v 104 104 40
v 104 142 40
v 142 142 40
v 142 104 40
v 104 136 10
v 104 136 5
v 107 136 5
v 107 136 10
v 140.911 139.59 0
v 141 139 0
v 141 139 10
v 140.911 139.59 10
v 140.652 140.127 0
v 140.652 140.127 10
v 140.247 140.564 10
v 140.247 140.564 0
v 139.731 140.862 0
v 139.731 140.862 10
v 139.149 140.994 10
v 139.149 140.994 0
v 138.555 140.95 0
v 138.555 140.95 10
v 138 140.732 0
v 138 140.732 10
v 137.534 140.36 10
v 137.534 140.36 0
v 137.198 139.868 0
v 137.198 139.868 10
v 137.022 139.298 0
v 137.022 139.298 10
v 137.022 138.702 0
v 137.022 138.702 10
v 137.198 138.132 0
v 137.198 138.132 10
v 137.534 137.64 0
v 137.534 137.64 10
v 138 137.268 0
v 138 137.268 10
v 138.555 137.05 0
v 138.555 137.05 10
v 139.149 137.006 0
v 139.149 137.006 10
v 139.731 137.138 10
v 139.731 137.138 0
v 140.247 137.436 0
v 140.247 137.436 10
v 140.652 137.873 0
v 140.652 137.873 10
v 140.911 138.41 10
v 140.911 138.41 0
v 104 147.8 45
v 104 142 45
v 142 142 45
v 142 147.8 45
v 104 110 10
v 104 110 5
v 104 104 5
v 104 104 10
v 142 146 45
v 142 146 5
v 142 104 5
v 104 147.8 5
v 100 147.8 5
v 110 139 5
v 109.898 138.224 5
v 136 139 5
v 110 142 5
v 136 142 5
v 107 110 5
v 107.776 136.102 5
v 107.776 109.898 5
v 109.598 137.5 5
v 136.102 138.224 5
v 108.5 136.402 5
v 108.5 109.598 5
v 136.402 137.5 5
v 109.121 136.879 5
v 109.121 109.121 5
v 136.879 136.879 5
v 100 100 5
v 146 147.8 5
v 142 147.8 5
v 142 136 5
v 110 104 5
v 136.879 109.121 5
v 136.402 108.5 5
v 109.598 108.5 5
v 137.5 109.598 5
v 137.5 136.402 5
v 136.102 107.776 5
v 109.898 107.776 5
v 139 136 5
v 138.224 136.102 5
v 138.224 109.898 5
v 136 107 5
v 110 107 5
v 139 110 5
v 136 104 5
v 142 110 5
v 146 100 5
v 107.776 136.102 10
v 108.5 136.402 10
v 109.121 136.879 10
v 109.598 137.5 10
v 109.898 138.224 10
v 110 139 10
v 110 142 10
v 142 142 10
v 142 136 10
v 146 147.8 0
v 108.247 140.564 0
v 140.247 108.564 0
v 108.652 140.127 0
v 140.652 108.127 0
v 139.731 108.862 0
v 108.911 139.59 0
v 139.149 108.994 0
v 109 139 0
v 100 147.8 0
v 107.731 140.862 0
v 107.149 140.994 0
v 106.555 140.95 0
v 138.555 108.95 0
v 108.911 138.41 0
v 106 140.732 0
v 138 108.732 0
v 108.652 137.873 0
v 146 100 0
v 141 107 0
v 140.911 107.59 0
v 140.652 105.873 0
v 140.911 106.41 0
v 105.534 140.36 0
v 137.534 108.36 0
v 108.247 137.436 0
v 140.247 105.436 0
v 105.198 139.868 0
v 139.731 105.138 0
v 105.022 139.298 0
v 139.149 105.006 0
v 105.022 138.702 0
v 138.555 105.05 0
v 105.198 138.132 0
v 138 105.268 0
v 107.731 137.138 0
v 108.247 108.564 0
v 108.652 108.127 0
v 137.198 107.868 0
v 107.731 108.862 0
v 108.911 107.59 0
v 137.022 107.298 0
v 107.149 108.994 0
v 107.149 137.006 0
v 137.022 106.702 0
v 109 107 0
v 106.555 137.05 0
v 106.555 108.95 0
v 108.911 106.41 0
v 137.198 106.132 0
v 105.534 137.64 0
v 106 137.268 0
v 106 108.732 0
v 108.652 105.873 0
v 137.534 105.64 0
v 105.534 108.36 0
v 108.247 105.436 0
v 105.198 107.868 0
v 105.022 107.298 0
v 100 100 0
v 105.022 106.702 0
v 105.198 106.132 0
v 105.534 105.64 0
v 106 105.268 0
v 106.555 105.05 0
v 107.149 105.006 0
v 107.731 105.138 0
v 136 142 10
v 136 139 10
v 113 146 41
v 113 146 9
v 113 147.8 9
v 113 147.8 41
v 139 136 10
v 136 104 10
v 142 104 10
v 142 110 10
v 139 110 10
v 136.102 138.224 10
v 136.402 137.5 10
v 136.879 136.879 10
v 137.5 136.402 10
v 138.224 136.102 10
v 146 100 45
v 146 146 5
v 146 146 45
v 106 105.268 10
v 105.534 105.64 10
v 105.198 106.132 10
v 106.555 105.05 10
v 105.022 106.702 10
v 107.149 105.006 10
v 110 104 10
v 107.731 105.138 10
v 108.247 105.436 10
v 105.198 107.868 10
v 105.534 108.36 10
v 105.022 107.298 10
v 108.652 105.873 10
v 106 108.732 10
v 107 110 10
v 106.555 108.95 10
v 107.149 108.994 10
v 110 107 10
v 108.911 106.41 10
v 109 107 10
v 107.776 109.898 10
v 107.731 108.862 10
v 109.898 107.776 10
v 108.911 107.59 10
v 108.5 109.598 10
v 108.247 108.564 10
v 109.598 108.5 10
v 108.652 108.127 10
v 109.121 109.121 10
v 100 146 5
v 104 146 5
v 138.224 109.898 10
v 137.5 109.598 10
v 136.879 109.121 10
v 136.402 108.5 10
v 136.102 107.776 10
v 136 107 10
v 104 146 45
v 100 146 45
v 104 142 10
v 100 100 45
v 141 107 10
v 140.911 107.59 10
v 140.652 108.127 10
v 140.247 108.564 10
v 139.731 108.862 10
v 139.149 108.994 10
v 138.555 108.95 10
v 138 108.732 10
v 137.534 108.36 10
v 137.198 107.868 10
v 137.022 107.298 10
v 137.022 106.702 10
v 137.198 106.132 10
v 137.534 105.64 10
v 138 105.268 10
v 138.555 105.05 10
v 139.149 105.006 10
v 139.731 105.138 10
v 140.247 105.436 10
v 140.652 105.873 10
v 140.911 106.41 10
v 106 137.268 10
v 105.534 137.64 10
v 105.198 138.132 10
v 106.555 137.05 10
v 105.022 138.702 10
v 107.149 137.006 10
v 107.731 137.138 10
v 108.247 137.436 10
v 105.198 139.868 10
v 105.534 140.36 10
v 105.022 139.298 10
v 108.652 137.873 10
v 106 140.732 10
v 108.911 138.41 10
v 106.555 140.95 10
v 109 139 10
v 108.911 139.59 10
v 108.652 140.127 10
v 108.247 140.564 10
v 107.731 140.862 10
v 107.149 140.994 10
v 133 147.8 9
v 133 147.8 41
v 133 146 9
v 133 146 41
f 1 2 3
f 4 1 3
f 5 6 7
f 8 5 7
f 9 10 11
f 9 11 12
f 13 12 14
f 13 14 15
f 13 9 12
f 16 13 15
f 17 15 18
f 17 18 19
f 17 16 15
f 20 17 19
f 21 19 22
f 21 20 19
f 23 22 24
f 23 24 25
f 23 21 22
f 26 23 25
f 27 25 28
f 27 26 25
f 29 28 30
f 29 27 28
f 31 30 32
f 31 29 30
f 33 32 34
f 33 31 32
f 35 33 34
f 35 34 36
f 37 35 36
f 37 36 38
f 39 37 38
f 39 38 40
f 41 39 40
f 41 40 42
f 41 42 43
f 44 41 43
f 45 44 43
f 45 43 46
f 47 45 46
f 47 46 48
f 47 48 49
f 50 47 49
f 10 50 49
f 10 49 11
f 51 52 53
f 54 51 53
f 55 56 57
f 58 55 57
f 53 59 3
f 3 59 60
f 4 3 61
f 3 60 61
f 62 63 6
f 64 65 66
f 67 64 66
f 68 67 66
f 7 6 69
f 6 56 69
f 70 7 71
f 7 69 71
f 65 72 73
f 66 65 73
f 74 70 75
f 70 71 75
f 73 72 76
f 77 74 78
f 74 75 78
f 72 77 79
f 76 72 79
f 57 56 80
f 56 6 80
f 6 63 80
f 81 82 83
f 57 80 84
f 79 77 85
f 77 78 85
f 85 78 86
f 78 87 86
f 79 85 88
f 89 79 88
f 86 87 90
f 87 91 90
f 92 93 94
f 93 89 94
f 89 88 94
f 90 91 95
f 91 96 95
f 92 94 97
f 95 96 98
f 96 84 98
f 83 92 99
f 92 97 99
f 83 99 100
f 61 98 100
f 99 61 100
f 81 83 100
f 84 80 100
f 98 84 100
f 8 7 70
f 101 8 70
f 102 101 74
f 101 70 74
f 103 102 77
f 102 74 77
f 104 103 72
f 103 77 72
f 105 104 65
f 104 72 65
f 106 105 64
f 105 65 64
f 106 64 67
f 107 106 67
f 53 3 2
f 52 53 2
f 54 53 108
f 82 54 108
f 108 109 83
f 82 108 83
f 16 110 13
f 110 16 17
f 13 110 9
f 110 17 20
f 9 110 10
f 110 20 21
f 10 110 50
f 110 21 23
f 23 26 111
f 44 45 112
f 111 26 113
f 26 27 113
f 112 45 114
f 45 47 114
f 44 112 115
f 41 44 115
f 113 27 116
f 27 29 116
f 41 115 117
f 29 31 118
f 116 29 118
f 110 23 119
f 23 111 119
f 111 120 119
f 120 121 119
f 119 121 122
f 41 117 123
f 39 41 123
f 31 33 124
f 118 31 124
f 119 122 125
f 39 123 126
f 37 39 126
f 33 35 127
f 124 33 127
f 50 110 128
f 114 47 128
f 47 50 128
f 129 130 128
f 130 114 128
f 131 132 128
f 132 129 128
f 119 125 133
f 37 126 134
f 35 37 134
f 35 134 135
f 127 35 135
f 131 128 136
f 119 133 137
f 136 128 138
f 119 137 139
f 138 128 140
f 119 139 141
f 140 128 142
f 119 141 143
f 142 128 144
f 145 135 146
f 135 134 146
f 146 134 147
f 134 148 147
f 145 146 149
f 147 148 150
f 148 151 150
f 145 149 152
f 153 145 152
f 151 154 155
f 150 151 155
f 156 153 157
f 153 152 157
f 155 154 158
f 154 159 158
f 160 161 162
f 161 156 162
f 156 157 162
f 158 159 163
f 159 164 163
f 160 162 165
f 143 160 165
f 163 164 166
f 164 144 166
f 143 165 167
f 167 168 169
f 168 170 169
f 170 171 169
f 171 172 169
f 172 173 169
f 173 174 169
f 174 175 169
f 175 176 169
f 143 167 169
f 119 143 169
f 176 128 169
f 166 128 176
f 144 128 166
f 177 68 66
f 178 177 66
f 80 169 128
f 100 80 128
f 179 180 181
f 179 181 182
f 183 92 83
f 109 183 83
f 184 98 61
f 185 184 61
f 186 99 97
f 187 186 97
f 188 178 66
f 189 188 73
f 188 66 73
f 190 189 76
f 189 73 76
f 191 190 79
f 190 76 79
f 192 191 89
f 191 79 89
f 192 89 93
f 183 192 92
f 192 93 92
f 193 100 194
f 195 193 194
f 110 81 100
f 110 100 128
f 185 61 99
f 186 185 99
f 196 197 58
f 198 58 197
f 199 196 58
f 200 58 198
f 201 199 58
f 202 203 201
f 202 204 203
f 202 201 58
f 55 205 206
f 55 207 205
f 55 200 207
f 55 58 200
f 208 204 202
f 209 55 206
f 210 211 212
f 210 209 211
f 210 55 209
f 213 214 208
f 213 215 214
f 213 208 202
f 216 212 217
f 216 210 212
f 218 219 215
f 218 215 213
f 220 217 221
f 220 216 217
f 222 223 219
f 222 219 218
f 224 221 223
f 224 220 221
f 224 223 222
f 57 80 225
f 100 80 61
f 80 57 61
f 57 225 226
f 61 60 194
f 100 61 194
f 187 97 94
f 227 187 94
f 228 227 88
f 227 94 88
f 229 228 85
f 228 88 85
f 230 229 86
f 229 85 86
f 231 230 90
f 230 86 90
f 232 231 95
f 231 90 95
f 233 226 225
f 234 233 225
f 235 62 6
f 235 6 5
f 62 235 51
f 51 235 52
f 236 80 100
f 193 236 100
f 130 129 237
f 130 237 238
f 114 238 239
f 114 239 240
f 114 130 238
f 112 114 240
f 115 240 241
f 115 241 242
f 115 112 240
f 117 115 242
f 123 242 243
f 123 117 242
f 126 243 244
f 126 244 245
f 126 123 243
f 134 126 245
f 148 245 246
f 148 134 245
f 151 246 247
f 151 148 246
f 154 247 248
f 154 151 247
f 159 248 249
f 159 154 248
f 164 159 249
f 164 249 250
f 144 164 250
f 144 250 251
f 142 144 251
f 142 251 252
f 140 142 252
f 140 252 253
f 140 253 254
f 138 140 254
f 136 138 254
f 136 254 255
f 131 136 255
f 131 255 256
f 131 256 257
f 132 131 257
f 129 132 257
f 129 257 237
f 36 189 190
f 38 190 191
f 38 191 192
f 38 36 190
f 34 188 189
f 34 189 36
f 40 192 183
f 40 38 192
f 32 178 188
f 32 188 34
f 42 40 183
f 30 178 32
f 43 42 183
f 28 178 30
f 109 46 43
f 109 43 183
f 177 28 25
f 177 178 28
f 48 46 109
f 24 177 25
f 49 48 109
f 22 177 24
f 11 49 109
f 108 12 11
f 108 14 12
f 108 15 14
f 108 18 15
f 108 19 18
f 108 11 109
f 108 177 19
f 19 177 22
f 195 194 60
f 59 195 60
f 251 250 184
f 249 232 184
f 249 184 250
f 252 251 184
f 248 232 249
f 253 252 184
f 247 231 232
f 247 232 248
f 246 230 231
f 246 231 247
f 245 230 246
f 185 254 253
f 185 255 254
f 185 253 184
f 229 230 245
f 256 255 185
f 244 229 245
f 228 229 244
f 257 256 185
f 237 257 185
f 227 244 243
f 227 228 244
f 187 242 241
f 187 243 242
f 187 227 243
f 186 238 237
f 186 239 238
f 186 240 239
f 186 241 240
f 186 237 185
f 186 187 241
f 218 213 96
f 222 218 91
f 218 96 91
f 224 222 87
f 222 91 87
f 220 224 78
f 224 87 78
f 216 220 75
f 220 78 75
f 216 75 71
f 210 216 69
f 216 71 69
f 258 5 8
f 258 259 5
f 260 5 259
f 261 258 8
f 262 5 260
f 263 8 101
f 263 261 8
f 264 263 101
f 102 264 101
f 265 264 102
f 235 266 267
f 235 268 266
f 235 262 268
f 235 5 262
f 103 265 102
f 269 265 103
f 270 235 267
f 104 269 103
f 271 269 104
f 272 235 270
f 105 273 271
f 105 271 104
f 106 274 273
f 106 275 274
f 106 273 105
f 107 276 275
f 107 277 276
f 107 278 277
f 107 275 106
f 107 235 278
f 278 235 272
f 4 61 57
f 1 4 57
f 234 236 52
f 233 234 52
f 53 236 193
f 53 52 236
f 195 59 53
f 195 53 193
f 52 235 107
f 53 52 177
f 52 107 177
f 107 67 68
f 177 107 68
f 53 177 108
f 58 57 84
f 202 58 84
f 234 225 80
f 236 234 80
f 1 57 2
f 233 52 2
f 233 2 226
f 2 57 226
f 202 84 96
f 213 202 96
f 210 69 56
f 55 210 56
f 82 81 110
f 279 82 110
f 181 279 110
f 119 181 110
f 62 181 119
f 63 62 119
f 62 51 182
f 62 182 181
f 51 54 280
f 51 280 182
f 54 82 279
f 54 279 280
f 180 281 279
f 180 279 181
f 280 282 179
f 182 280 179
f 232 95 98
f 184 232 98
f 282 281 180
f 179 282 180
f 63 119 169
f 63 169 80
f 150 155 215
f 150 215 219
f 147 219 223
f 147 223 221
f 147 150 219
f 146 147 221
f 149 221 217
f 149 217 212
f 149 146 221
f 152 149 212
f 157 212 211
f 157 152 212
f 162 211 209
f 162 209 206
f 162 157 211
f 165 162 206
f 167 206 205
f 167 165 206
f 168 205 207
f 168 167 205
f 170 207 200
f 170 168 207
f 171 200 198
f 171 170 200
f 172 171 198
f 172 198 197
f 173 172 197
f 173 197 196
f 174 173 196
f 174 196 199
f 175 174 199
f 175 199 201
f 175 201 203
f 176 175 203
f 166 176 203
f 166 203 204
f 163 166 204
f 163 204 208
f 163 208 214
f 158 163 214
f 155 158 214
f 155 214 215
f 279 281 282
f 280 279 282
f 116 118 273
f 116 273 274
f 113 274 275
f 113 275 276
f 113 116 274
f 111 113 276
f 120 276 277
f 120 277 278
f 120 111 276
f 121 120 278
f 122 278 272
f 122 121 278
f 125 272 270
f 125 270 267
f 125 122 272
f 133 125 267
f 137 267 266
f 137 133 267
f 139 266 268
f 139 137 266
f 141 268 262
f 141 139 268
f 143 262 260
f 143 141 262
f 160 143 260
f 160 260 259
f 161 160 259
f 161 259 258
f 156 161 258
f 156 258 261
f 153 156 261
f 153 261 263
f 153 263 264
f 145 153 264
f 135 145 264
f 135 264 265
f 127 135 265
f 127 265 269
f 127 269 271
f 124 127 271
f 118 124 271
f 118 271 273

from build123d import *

# Parameters (mm, degrees)
F1_R     = 2
F2_DEPTH = 5
F3_DEPTH = 10
F4_DEPTH = 45
F5_START = 5
F5_DEPTH = 40
F6_START = 40
F6_DEPTH = 5
F7_W     = 20
F7_H     = 32
F8_DEPTH = 1.8


with BuildPart() as f2:
    # F1 (on Top) → F2 (new body)
    with BuildSketch(Plane.XY):
        with BuildLine():
            Line((110, 142), (104, 142))
            Line((104, 142), (104, 136))
            Line((104, 136), (107, 136))
            ThreePointArc((107, 136), (109.1213203436, 136.8786796564), (110, 139))
            Line((110, 139), (110, 142))
        make_face()
        with Locations((107, 139)):
            Circle(F1_R, mode=Mode.SUBTRACT)
        with BuildLine():
            Line((136, 142), (110, 142))
            Line((110, 142), (110, 139))
            ThreePointArc((110, 139), (109.1213203436, 136.8786796564), (107, 136))
            Line((107, 136), (104, 136))
            Line((104, 136), (104, 110))
            Line((104, 110), (107, 110))
            ThreePointArc((107, 110), (109.1213203436, 109.1213203436), (110, 107))
            Line((110, 107), (110, 104))
            Line((110, 104), (136, 104))
            Line((136, 104), (136, 107))
            ThreePointArc((136, 107), (136.8786796564, 109.1213203436), (139, 110))
            Line((139, 110), (142, 110))
            Line((142, 110), (142, 136))
            Line((142, 136), (139, 136))
            ThreePointArc((139, 136), (136.8786796564, 136.8786796564), (136, 139))
            Line((136, 139), (136, 142))
        make_face()
        Polygon((100, 146), (100, 100), (146, 100), (146, 146), (142, 146), (142, 142), (142, 136), (142, 110), (142, 104), (136, 104), (110, 104), (104, 104), (104, 110), (104, 136), (104, 142), (104, 146), align=None)
        with BuildLine():
            Line((142, 136), (142, 142))
            Line((142, 142), (136, 142))
            Line((136, 142), (136, 139))
            ThreePointArc((136, 139), (136.8786796564, 136.8786796564), (139, 136))
            Line((139, 136), (142, 136))
        make_face()
        with Locations((139, 139)):
            Circle(F1_R, mode=Mode.SUBTRACT)
        with BuildLine():
            Line((107, 110), (104, 110))
            Line((104, 110), (104, 104))
            Line((104, 104), (110, 104))
            Line((110, 104), (110, 107))
            ThreePointArc((110, 107), (109.1213203436, 109.1213203436), (107, 110))
        make_face()
        with Locations((107, 107)):
            Circle(F1_R, mode=Mode.SUBTRACT)
        with BuildLine():
            Line((142, 104), (142, 110))
            Line((142, 110), (139, 110))
            ThreePointArc((139, 110), (136.8786796564, 109.1213203436), (136, 107))
            Line((136, 107), (136, 104))
            Line((136, 104), (142, 104))
        make_face()
        with Locations((139, 107)):
            Circle(F1_R, mode=Mode.SUBTRACT)
        Polygon((142, 146), (104, 146), (104, 142), (110, 142), (136, 142), (142, 142), align=None)
    extrude(amount=F2_DEPTH)

    # F1 (on Top) → F3 (join)
    with BuildSketch(Plane.XY):
        with BuildLine():
            Line((110, 142), (104, 142))
            Line((104, 142), (104, 136))
            Line((104, 136), (107, 136))
            ThreePointArc((107, 136), (109.1213203436, 136.8786796564), (110, 139))
            Line((110, 139), (110, 142))
        make_face()
        with Locations((107, 139)):
            Circle(F1_R, mode=Mode.SUBTRACT)
        with BuildLine():
            Line((142, 136), (142, 142))
            Line((142, 142), (136, 142))
            Line((136, 142), (136, 139))
            ThreePointArc((136, 139), (136.8786796564, 136.8786796564), (139, 136))
            Line((139, 136), (142, 136))
        make_face()
        with Locations((139, 139)):
            Circle(F1_R, mode=Mode.SUBTRACT)
        with BuildLine():
            Line((107, 110), (104, 110))
            Line((104, 110), (104, 104))
            Line((104, 104), (110, 104))
            Line((110, 104), (110, 107))
            ThreePointArc((110, 107), (109.1213203436, 109.1213203436), (107, 110))
        make_face()
        with Locations((107, 107)):
            Circle(F1_R, mode=Mode.SUBTRACT)
        with BuildLine():
            Line((142, 104), (142, 110))
            Line((142, 110), (139, 110))
            ThreePointArc((139, 110), (136.8786796564, 109.1213203436), (136, 107))
            Line((136, 107), (136, 104))
            Line((136, 104), (142, 104))
        make_face()
        with Locations((139, 107)):
            Circle(F1_R, mode=Mode.SUBTRACT)
    extrude(amount=F3_DEPTH)

    # F1 (on Top) → F4 (join)
    with BuildSketch(Plane.XY):
        Polygon((142, 146), (104, 146), (104, 142), (110, 142), (136, 142), (142, 142), align=None)
    extrude(amount=F4_DEPTH)

    # F7 (on face) → F8 (join)
    with BuildSketch(Plane(origin=(0, 146, 0), x_dir=(-1, 0, 0), z_dir=(0, 1, 0))):
        Polygon((-146, 5), (-146, 0), (-100, 0), (-100, 5), (-104, 5), (-104, 45), (-142, 45), (-142, 5), align=None)
        with Locations((-123, 25)):
            Rectangle(F7_W, F7_H, mode=Mode.SUBTRACT)
    extrude(amount=F8_DEPTH)


with BuildPart() as f5:
    # F1 (on Top) → F5 (new body)
    with BuildSketch(Plane.XY.offset(F5_START)):
        Polygon((100, 146), (100, 100), (146, 100), (146, 146), (142, 146), (142, 142), (142, 136), (142, 110), (142, 104), (136, 104), (110, 104), (104, 104), (104, 110), (104, 136), (104, 142), (104, 146), align=None)
    extrude(amount=F5_DEPTH)

    # F1 (on Top) → F6 (join)
    with BuildSketch(Plane.XY.offset(F6_START)):
        with BuildLine():
            Line((136, 142), (110, 142))
            Line((110, 142), (110, 139))
            ThreePointArc((110, 139), (109.1213203436, 136.8786796564), (107, 136))
            Line((107, 136), (104, 136))
            Line((104, 136), (104, 110))
            Line((104, 110), (107, 110))
            ThreePointArc((107, 110), (109.1213203436, 109.1213203436), (110, 107))
            Line((110, 107), (110, 104))
            Line((110, 104), (136, 104))
            Line((136, 104), (136, 107))
            ThreePointArc((136, 107), (136.8786796564, 109.1213203436), (139, 110))
            Line((139, 110), (142, 110))
            Line((142, 110), (142, 136))
            Line((142, 136), (139, 136))
            ThreePointArc((139, 136), (136.8786796564, 136.8786796564), (136, 139))
            Line((136, 139), (136, 142))
        make_face()
        with BuildLine():
            Line((107, 110), (104, 110))
            Line((104, 110), (104, 104))
            Line((104, 104), (110, 104))
            Line((110, 104), (110, 107))
            ThreePointArc((110, 107), (109.1213203436, 109.1213203436), (107, 110))
        make_face()
        with Locations((107, 107)):
            Circle(F1_R, mode=Mode.SUBTRACT)
        with BuildLine():
            Line((142, 104), (142, 110))
            Line((142, 110), (139, 110))
            ThreePointArc((139, 110), (136.8786796564, 109.1213203436), (136, 107))
            Line((136, 107), (136, 104))
            Line((136, 104), (142, 104))
        make_face()
        with Locations((139, 107)):
            Circle(F1_R, mode=Mode.SUBTRACT)
        with BuildLine():
            Line((142, 136), (142, 142))
            Line((142, 142), (136, 142))
            Line((136, 142), (136, 139))
            ThreePointArc((136, 139), (136.8786796564, 136.8786796564), (139, 136))
            Line((139, 136), (142, 136))
        make_face()
        with Locations((139, 139)):
            Circle(F1_R, mode=Mode.SUBTRACT)
        with BuildLine():
            Line((110, 142), (104, 142))
            Line((104, 142), (104, 136))
            Line((104, 136), (107, 136))
            ThreePointArc((107, 136), (109.1213203436, 136.8786796564), (110, 139))
            Line((110, 139), (110, 142))
        make_face()
        with Locations((107, 139)):
            Circle(F1_R, mode=Mode.SUBTRACT)
        with Locations((107, 107)):
            Circle(F1_R)
        with Locations((139, 107)):
            Circle(F1_R)
        with Locations((107, 139)):
            Circle(F1_R)
        with Locations((139, 139)):
            Circle(F1_R)
    extrude(amount=F6_DEPTH)


solid = Compound([f2.part, f5.part])
